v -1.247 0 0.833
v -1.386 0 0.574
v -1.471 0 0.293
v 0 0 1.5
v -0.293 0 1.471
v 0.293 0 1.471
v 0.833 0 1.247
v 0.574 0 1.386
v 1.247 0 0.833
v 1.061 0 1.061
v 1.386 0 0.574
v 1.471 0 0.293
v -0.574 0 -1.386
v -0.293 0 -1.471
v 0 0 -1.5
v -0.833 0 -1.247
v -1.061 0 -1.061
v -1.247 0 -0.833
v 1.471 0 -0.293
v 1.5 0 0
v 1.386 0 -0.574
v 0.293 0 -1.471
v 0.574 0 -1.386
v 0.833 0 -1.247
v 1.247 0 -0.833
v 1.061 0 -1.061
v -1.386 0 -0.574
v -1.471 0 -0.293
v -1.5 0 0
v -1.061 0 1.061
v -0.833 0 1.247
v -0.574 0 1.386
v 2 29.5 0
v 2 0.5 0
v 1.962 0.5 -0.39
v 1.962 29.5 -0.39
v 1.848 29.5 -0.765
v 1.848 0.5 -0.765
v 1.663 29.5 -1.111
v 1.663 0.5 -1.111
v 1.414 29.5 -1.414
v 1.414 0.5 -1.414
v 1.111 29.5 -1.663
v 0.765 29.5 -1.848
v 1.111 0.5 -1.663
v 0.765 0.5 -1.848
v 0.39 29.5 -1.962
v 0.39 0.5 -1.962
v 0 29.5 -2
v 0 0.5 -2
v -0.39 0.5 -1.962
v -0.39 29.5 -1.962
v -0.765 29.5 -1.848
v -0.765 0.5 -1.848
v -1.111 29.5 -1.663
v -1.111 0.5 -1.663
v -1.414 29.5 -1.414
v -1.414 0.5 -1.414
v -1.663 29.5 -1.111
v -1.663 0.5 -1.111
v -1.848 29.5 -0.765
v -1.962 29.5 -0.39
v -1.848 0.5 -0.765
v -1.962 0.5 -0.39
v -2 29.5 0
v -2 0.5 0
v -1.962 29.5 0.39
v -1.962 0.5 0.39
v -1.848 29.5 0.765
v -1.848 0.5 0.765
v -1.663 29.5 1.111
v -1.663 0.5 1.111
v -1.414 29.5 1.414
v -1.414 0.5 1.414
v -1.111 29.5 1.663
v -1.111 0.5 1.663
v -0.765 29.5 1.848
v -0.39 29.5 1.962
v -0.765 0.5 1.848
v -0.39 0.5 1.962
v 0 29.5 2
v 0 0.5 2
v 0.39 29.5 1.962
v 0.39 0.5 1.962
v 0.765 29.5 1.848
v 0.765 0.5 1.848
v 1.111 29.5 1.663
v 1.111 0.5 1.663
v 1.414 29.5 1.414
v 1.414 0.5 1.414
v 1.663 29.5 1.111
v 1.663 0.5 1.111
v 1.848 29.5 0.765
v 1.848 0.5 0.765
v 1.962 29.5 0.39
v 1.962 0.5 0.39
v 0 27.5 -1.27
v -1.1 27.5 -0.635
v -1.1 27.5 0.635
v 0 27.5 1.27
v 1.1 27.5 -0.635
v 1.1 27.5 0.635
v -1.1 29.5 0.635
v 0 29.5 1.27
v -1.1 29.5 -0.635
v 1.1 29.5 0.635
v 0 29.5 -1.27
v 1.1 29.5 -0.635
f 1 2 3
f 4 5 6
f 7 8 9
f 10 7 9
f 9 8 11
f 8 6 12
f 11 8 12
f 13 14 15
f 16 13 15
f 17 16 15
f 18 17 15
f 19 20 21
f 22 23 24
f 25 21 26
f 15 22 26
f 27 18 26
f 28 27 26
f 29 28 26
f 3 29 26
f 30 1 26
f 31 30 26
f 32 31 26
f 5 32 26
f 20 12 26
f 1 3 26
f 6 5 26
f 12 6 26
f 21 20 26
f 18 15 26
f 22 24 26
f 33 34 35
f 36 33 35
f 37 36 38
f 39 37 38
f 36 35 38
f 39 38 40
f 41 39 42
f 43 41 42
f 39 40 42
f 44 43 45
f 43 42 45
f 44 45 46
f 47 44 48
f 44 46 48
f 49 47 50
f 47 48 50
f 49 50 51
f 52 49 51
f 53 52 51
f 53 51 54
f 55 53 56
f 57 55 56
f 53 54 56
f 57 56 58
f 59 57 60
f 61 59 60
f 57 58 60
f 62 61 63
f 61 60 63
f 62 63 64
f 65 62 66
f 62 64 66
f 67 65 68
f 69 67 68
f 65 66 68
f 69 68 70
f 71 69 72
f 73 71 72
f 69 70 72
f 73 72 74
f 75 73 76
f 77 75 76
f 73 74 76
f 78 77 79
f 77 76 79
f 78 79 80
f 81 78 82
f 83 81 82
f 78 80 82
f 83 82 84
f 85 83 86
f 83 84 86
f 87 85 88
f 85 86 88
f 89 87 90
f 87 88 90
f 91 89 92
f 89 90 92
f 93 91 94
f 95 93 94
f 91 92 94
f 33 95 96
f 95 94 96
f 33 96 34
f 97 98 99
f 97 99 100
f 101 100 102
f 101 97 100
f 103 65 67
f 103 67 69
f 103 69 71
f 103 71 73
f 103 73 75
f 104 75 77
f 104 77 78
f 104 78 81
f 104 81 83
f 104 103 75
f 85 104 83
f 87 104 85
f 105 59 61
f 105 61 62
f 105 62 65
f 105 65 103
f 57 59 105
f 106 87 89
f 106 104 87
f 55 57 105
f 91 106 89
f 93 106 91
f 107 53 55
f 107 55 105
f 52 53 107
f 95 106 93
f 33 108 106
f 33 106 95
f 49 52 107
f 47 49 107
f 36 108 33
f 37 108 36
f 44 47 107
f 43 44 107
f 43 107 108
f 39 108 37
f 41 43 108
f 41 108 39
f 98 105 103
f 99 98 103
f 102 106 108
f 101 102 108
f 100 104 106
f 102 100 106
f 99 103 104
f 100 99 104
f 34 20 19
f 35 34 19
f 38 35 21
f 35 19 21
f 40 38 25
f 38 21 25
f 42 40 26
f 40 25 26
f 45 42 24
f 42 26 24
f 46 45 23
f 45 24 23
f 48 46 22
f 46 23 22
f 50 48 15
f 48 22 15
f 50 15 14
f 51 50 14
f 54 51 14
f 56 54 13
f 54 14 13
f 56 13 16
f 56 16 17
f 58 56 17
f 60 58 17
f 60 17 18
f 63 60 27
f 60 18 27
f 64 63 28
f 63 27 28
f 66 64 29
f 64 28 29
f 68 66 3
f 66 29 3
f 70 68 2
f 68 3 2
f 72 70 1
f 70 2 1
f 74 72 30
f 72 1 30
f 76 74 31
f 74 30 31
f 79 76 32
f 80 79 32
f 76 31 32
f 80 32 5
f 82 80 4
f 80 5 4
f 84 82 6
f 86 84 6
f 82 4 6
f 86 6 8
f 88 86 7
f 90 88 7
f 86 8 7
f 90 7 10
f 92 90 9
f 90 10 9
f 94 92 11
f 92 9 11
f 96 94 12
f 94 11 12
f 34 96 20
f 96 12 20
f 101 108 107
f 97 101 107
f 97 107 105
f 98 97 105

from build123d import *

# Parameters (mm, degrees)
SKETCH1_R           = 2
BOSS_EXTRUDE1_DEPTH = 29.5
CHAMFER1_SIZE       = 0.5
CUT_EXTRUDE1_DEPTH  = 2


with BuildPart() as part:
    # Sketch1 → Boss-Extrude1 (new body)
    with BuildSketch(Plane(origin=(0, 0, 0), x_dir=(1, 0, 0), z_dir=(0, 1, 0))):
        Circle(SKETCH1_R)
    extrude(amount=BOSS_EXTRUDE1_DEPTH)

    # Chamfer1
    chamfer1_edges = [part.edges().sort_by_distance(p)[0] for p in [
        (-2, 0, 0),
    ]]
    chamfer(chamfer1_edges, length=CHAMFER1_SIZE)

    # Sketch2 → Cut-Extrude1 (cut)
    with BuildSketch(Plane(origin=(0, 29.5, 0), x_dir=(1, 0, 0), z_dir=(0, 1, 0))):
        Polygon((1.1, 0.635085296), (0, 1.270170592), (-1.1, 0.635085296), (-1.1, -0.635085296), (0, -1.270170592), (1.1, -0.635085296), align=None)
    extrude(amount=-CUT_EXTRUDE1_DEPTH, mode=Mode.SUBTRACT)


solid = part.part
